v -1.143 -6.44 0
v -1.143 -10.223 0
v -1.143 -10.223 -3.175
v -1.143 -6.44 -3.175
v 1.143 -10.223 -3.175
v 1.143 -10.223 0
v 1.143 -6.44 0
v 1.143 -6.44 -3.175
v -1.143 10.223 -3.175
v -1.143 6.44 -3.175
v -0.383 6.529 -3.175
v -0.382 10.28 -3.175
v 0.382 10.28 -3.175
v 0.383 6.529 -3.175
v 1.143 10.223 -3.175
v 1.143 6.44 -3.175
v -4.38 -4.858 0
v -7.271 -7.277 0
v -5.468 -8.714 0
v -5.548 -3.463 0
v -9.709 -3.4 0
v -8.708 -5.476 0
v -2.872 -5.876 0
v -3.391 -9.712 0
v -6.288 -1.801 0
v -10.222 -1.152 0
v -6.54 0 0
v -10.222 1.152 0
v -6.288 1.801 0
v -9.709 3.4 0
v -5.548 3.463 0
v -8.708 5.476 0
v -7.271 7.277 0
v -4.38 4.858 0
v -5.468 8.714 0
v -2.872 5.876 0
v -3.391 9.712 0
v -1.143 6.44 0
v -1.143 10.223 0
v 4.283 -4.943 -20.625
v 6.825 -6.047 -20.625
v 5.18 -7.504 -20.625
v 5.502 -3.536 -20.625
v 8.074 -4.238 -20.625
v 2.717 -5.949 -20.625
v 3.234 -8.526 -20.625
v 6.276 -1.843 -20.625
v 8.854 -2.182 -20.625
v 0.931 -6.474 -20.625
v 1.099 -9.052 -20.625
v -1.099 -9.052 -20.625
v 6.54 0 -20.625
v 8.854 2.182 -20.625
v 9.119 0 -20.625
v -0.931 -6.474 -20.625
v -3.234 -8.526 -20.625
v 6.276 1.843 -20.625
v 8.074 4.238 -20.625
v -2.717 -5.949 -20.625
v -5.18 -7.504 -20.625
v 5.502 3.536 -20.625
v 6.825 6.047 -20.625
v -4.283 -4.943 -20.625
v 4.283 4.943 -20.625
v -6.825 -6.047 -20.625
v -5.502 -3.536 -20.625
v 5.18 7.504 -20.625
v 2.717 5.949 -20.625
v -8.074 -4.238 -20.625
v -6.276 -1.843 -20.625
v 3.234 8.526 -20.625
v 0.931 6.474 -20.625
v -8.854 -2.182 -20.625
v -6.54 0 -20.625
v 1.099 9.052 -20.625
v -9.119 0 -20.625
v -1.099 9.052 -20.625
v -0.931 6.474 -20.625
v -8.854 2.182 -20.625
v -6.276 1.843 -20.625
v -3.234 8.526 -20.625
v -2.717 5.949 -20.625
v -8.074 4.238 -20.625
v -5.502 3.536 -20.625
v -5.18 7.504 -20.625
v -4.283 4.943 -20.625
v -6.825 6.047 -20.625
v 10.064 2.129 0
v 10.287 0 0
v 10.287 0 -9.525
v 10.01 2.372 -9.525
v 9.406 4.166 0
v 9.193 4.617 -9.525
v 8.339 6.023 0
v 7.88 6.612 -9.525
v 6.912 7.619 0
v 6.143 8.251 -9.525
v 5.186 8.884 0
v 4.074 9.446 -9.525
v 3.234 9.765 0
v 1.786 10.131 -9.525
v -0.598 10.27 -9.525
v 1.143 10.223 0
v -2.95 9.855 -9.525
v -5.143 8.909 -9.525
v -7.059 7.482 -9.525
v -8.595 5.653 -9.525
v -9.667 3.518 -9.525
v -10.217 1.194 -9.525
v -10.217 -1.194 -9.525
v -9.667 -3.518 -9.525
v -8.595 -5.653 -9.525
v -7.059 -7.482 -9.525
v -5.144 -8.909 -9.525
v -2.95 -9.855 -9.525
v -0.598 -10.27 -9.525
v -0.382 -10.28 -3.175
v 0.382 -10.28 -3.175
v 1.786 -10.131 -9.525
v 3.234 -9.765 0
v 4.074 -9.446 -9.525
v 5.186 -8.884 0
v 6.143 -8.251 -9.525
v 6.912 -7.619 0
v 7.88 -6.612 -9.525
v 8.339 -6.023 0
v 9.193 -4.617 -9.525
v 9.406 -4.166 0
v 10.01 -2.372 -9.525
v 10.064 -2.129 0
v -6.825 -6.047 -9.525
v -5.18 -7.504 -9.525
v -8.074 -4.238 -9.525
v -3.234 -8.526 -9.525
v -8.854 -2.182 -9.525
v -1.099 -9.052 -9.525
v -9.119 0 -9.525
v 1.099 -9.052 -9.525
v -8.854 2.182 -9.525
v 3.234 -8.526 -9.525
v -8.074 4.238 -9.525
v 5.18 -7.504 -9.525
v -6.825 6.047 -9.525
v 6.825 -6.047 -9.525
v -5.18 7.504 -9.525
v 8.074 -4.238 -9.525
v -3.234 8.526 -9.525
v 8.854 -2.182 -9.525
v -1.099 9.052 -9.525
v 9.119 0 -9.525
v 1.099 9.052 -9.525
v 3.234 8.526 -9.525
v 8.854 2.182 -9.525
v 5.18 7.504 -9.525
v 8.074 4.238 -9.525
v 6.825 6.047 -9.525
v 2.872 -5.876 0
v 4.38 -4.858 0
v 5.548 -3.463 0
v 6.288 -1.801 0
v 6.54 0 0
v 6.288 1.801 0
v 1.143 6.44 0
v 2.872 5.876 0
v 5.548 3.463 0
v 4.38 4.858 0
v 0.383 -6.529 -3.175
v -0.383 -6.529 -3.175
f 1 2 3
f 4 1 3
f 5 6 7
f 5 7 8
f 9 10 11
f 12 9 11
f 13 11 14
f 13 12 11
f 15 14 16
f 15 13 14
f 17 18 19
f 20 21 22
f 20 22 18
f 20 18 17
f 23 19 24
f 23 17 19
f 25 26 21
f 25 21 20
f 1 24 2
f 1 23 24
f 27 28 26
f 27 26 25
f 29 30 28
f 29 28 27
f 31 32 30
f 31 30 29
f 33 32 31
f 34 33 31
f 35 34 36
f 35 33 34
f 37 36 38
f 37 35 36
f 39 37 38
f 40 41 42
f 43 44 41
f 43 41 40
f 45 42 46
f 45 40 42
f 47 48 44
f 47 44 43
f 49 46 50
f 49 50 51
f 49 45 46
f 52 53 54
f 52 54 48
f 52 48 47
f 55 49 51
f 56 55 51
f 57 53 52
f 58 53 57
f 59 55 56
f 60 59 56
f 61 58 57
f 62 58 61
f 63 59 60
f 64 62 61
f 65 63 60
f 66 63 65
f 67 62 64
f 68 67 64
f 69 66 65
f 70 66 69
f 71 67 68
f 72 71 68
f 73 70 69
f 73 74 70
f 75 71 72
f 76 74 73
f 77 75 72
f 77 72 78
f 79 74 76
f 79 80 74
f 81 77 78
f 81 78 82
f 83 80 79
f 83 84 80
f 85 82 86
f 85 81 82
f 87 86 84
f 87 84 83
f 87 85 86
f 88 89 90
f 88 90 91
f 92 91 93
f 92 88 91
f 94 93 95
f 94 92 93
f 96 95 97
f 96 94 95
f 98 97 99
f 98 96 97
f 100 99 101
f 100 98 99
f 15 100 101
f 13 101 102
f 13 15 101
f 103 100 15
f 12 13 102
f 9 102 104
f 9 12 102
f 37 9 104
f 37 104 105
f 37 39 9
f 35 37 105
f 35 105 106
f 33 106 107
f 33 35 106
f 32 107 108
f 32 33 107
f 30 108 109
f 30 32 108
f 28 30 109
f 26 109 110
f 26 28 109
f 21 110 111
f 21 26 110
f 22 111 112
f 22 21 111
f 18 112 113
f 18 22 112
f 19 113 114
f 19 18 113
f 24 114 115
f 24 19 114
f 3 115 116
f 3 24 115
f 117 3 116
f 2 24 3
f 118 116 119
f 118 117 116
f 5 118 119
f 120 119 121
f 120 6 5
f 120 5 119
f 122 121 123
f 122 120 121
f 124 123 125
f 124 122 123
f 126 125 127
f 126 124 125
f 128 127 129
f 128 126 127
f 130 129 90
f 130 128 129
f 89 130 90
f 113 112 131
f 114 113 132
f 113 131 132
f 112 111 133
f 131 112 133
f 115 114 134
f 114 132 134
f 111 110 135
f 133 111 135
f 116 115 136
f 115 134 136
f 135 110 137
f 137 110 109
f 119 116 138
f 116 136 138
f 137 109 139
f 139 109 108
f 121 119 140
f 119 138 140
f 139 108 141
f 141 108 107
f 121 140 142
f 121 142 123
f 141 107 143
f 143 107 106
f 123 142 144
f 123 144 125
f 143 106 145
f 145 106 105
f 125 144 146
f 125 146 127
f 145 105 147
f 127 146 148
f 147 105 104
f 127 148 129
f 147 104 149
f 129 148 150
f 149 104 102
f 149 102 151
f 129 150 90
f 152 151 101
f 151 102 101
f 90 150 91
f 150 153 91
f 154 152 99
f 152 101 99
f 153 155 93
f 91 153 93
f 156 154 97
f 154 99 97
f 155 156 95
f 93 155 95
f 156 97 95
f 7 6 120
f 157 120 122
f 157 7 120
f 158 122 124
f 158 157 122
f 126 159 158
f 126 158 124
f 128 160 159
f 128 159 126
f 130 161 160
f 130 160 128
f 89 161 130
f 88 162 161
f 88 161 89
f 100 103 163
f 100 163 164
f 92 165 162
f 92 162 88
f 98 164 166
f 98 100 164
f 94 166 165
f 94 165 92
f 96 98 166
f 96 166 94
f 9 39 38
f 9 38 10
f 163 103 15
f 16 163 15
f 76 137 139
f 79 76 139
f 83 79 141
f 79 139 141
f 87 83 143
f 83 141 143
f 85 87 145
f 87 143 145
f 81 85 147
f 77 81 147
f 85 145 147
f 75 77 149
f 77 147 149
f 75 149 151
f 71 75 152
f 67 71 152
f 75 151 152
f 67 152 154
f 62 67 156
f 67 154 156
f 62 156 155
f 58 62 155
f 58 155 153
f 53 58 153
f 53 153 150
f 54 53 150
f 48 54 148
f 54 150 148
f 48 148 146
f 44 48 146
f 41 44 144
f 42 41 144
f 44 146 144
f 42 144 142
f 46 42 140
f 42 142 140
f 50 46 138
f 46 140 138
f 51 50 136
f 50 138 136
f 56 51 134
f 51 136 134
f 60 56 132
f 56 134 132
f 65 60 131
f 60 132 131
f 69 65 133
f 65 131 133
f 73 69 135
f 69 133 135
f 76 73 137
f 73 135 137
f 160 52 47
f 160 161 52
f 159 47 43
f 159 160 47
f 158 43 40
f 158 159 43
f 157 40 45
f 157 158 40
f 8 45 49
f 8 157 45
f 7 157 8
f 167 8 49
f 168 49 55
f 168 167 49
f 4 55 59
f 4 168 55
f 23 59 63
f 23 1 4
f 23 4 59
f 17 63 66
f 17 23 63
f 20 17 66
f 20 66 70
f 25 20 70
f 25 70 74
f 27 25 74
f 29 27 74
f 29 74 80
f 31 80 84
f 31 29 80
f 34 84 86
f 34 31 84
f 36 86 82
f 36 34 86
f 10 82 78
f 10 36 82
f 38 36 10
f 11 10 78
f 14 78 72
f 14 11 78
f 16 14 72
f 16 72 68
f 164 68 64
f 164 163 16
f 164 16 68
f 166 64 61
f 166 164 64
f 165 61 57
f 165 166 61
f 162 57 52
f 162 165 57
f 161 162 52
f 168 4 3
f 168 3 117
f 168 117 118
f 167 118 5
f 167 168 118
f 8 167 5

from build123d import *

# Parameters (mm, degrees)
SKETCH1_R           = 10.287
SKETCH1_R_2         = 6.5405
BOSS_EXTRUDE1_DEPTH = 9.525
SKETCH3_R           = 9.1186
SKETCH3_R_2         = 6.5405
BOSS_EXTRUDE3_DEPTH = 11.0998
SKETCH4_W           = 2.286
SKETCH4_H           = 3.175
CUT_EXTRUDE1_DEPTH  = 14.4399


with BuildPart() as part:
    # Sketch1 → Boss-Extrude1 (new body)
    with BuildSketch(Plane.XY):
        Circle(SKETCH1_R)
        Circle(SKETCH1_R_2, mode=Mode.SUBTRACT)
    extrude(amount=-BOSS_EXTRUDE1_DEPTH)

    # Sketch3 → Boss-Extrude3 (add)
    with BuildSketch(Plane(origin=(0, 0, -9.525), x_dir=(-1, 0, 0), z_dir=(0, 0, -1))):
        Circle(SKETCH3_R)
        with Locations(Location((0, 0, 0), (0, 0, 180))):
            Circle(SKETCH3_R_2, mode=Mode.SUBTRACT)
    extrude(amount=BOSS_EXTRUDE3_DEPTH)

    # Sketch4 → Cut-Extrude1 (cut, symmetric)
    with BuildSketch(Plane(origin=(0, 0, 0), x_dir=(1, 0, 0), z_dir=(0, 1, 0))):
        with Locations((0, 1.5875)):
            Rectangle(SKETCH4_W, SKETCH4_H)
    extrude(amount=CUT_EXTRUDE1_DEPTH, both=True, mode=Mode.SUBTRACT)


solid = part.part
